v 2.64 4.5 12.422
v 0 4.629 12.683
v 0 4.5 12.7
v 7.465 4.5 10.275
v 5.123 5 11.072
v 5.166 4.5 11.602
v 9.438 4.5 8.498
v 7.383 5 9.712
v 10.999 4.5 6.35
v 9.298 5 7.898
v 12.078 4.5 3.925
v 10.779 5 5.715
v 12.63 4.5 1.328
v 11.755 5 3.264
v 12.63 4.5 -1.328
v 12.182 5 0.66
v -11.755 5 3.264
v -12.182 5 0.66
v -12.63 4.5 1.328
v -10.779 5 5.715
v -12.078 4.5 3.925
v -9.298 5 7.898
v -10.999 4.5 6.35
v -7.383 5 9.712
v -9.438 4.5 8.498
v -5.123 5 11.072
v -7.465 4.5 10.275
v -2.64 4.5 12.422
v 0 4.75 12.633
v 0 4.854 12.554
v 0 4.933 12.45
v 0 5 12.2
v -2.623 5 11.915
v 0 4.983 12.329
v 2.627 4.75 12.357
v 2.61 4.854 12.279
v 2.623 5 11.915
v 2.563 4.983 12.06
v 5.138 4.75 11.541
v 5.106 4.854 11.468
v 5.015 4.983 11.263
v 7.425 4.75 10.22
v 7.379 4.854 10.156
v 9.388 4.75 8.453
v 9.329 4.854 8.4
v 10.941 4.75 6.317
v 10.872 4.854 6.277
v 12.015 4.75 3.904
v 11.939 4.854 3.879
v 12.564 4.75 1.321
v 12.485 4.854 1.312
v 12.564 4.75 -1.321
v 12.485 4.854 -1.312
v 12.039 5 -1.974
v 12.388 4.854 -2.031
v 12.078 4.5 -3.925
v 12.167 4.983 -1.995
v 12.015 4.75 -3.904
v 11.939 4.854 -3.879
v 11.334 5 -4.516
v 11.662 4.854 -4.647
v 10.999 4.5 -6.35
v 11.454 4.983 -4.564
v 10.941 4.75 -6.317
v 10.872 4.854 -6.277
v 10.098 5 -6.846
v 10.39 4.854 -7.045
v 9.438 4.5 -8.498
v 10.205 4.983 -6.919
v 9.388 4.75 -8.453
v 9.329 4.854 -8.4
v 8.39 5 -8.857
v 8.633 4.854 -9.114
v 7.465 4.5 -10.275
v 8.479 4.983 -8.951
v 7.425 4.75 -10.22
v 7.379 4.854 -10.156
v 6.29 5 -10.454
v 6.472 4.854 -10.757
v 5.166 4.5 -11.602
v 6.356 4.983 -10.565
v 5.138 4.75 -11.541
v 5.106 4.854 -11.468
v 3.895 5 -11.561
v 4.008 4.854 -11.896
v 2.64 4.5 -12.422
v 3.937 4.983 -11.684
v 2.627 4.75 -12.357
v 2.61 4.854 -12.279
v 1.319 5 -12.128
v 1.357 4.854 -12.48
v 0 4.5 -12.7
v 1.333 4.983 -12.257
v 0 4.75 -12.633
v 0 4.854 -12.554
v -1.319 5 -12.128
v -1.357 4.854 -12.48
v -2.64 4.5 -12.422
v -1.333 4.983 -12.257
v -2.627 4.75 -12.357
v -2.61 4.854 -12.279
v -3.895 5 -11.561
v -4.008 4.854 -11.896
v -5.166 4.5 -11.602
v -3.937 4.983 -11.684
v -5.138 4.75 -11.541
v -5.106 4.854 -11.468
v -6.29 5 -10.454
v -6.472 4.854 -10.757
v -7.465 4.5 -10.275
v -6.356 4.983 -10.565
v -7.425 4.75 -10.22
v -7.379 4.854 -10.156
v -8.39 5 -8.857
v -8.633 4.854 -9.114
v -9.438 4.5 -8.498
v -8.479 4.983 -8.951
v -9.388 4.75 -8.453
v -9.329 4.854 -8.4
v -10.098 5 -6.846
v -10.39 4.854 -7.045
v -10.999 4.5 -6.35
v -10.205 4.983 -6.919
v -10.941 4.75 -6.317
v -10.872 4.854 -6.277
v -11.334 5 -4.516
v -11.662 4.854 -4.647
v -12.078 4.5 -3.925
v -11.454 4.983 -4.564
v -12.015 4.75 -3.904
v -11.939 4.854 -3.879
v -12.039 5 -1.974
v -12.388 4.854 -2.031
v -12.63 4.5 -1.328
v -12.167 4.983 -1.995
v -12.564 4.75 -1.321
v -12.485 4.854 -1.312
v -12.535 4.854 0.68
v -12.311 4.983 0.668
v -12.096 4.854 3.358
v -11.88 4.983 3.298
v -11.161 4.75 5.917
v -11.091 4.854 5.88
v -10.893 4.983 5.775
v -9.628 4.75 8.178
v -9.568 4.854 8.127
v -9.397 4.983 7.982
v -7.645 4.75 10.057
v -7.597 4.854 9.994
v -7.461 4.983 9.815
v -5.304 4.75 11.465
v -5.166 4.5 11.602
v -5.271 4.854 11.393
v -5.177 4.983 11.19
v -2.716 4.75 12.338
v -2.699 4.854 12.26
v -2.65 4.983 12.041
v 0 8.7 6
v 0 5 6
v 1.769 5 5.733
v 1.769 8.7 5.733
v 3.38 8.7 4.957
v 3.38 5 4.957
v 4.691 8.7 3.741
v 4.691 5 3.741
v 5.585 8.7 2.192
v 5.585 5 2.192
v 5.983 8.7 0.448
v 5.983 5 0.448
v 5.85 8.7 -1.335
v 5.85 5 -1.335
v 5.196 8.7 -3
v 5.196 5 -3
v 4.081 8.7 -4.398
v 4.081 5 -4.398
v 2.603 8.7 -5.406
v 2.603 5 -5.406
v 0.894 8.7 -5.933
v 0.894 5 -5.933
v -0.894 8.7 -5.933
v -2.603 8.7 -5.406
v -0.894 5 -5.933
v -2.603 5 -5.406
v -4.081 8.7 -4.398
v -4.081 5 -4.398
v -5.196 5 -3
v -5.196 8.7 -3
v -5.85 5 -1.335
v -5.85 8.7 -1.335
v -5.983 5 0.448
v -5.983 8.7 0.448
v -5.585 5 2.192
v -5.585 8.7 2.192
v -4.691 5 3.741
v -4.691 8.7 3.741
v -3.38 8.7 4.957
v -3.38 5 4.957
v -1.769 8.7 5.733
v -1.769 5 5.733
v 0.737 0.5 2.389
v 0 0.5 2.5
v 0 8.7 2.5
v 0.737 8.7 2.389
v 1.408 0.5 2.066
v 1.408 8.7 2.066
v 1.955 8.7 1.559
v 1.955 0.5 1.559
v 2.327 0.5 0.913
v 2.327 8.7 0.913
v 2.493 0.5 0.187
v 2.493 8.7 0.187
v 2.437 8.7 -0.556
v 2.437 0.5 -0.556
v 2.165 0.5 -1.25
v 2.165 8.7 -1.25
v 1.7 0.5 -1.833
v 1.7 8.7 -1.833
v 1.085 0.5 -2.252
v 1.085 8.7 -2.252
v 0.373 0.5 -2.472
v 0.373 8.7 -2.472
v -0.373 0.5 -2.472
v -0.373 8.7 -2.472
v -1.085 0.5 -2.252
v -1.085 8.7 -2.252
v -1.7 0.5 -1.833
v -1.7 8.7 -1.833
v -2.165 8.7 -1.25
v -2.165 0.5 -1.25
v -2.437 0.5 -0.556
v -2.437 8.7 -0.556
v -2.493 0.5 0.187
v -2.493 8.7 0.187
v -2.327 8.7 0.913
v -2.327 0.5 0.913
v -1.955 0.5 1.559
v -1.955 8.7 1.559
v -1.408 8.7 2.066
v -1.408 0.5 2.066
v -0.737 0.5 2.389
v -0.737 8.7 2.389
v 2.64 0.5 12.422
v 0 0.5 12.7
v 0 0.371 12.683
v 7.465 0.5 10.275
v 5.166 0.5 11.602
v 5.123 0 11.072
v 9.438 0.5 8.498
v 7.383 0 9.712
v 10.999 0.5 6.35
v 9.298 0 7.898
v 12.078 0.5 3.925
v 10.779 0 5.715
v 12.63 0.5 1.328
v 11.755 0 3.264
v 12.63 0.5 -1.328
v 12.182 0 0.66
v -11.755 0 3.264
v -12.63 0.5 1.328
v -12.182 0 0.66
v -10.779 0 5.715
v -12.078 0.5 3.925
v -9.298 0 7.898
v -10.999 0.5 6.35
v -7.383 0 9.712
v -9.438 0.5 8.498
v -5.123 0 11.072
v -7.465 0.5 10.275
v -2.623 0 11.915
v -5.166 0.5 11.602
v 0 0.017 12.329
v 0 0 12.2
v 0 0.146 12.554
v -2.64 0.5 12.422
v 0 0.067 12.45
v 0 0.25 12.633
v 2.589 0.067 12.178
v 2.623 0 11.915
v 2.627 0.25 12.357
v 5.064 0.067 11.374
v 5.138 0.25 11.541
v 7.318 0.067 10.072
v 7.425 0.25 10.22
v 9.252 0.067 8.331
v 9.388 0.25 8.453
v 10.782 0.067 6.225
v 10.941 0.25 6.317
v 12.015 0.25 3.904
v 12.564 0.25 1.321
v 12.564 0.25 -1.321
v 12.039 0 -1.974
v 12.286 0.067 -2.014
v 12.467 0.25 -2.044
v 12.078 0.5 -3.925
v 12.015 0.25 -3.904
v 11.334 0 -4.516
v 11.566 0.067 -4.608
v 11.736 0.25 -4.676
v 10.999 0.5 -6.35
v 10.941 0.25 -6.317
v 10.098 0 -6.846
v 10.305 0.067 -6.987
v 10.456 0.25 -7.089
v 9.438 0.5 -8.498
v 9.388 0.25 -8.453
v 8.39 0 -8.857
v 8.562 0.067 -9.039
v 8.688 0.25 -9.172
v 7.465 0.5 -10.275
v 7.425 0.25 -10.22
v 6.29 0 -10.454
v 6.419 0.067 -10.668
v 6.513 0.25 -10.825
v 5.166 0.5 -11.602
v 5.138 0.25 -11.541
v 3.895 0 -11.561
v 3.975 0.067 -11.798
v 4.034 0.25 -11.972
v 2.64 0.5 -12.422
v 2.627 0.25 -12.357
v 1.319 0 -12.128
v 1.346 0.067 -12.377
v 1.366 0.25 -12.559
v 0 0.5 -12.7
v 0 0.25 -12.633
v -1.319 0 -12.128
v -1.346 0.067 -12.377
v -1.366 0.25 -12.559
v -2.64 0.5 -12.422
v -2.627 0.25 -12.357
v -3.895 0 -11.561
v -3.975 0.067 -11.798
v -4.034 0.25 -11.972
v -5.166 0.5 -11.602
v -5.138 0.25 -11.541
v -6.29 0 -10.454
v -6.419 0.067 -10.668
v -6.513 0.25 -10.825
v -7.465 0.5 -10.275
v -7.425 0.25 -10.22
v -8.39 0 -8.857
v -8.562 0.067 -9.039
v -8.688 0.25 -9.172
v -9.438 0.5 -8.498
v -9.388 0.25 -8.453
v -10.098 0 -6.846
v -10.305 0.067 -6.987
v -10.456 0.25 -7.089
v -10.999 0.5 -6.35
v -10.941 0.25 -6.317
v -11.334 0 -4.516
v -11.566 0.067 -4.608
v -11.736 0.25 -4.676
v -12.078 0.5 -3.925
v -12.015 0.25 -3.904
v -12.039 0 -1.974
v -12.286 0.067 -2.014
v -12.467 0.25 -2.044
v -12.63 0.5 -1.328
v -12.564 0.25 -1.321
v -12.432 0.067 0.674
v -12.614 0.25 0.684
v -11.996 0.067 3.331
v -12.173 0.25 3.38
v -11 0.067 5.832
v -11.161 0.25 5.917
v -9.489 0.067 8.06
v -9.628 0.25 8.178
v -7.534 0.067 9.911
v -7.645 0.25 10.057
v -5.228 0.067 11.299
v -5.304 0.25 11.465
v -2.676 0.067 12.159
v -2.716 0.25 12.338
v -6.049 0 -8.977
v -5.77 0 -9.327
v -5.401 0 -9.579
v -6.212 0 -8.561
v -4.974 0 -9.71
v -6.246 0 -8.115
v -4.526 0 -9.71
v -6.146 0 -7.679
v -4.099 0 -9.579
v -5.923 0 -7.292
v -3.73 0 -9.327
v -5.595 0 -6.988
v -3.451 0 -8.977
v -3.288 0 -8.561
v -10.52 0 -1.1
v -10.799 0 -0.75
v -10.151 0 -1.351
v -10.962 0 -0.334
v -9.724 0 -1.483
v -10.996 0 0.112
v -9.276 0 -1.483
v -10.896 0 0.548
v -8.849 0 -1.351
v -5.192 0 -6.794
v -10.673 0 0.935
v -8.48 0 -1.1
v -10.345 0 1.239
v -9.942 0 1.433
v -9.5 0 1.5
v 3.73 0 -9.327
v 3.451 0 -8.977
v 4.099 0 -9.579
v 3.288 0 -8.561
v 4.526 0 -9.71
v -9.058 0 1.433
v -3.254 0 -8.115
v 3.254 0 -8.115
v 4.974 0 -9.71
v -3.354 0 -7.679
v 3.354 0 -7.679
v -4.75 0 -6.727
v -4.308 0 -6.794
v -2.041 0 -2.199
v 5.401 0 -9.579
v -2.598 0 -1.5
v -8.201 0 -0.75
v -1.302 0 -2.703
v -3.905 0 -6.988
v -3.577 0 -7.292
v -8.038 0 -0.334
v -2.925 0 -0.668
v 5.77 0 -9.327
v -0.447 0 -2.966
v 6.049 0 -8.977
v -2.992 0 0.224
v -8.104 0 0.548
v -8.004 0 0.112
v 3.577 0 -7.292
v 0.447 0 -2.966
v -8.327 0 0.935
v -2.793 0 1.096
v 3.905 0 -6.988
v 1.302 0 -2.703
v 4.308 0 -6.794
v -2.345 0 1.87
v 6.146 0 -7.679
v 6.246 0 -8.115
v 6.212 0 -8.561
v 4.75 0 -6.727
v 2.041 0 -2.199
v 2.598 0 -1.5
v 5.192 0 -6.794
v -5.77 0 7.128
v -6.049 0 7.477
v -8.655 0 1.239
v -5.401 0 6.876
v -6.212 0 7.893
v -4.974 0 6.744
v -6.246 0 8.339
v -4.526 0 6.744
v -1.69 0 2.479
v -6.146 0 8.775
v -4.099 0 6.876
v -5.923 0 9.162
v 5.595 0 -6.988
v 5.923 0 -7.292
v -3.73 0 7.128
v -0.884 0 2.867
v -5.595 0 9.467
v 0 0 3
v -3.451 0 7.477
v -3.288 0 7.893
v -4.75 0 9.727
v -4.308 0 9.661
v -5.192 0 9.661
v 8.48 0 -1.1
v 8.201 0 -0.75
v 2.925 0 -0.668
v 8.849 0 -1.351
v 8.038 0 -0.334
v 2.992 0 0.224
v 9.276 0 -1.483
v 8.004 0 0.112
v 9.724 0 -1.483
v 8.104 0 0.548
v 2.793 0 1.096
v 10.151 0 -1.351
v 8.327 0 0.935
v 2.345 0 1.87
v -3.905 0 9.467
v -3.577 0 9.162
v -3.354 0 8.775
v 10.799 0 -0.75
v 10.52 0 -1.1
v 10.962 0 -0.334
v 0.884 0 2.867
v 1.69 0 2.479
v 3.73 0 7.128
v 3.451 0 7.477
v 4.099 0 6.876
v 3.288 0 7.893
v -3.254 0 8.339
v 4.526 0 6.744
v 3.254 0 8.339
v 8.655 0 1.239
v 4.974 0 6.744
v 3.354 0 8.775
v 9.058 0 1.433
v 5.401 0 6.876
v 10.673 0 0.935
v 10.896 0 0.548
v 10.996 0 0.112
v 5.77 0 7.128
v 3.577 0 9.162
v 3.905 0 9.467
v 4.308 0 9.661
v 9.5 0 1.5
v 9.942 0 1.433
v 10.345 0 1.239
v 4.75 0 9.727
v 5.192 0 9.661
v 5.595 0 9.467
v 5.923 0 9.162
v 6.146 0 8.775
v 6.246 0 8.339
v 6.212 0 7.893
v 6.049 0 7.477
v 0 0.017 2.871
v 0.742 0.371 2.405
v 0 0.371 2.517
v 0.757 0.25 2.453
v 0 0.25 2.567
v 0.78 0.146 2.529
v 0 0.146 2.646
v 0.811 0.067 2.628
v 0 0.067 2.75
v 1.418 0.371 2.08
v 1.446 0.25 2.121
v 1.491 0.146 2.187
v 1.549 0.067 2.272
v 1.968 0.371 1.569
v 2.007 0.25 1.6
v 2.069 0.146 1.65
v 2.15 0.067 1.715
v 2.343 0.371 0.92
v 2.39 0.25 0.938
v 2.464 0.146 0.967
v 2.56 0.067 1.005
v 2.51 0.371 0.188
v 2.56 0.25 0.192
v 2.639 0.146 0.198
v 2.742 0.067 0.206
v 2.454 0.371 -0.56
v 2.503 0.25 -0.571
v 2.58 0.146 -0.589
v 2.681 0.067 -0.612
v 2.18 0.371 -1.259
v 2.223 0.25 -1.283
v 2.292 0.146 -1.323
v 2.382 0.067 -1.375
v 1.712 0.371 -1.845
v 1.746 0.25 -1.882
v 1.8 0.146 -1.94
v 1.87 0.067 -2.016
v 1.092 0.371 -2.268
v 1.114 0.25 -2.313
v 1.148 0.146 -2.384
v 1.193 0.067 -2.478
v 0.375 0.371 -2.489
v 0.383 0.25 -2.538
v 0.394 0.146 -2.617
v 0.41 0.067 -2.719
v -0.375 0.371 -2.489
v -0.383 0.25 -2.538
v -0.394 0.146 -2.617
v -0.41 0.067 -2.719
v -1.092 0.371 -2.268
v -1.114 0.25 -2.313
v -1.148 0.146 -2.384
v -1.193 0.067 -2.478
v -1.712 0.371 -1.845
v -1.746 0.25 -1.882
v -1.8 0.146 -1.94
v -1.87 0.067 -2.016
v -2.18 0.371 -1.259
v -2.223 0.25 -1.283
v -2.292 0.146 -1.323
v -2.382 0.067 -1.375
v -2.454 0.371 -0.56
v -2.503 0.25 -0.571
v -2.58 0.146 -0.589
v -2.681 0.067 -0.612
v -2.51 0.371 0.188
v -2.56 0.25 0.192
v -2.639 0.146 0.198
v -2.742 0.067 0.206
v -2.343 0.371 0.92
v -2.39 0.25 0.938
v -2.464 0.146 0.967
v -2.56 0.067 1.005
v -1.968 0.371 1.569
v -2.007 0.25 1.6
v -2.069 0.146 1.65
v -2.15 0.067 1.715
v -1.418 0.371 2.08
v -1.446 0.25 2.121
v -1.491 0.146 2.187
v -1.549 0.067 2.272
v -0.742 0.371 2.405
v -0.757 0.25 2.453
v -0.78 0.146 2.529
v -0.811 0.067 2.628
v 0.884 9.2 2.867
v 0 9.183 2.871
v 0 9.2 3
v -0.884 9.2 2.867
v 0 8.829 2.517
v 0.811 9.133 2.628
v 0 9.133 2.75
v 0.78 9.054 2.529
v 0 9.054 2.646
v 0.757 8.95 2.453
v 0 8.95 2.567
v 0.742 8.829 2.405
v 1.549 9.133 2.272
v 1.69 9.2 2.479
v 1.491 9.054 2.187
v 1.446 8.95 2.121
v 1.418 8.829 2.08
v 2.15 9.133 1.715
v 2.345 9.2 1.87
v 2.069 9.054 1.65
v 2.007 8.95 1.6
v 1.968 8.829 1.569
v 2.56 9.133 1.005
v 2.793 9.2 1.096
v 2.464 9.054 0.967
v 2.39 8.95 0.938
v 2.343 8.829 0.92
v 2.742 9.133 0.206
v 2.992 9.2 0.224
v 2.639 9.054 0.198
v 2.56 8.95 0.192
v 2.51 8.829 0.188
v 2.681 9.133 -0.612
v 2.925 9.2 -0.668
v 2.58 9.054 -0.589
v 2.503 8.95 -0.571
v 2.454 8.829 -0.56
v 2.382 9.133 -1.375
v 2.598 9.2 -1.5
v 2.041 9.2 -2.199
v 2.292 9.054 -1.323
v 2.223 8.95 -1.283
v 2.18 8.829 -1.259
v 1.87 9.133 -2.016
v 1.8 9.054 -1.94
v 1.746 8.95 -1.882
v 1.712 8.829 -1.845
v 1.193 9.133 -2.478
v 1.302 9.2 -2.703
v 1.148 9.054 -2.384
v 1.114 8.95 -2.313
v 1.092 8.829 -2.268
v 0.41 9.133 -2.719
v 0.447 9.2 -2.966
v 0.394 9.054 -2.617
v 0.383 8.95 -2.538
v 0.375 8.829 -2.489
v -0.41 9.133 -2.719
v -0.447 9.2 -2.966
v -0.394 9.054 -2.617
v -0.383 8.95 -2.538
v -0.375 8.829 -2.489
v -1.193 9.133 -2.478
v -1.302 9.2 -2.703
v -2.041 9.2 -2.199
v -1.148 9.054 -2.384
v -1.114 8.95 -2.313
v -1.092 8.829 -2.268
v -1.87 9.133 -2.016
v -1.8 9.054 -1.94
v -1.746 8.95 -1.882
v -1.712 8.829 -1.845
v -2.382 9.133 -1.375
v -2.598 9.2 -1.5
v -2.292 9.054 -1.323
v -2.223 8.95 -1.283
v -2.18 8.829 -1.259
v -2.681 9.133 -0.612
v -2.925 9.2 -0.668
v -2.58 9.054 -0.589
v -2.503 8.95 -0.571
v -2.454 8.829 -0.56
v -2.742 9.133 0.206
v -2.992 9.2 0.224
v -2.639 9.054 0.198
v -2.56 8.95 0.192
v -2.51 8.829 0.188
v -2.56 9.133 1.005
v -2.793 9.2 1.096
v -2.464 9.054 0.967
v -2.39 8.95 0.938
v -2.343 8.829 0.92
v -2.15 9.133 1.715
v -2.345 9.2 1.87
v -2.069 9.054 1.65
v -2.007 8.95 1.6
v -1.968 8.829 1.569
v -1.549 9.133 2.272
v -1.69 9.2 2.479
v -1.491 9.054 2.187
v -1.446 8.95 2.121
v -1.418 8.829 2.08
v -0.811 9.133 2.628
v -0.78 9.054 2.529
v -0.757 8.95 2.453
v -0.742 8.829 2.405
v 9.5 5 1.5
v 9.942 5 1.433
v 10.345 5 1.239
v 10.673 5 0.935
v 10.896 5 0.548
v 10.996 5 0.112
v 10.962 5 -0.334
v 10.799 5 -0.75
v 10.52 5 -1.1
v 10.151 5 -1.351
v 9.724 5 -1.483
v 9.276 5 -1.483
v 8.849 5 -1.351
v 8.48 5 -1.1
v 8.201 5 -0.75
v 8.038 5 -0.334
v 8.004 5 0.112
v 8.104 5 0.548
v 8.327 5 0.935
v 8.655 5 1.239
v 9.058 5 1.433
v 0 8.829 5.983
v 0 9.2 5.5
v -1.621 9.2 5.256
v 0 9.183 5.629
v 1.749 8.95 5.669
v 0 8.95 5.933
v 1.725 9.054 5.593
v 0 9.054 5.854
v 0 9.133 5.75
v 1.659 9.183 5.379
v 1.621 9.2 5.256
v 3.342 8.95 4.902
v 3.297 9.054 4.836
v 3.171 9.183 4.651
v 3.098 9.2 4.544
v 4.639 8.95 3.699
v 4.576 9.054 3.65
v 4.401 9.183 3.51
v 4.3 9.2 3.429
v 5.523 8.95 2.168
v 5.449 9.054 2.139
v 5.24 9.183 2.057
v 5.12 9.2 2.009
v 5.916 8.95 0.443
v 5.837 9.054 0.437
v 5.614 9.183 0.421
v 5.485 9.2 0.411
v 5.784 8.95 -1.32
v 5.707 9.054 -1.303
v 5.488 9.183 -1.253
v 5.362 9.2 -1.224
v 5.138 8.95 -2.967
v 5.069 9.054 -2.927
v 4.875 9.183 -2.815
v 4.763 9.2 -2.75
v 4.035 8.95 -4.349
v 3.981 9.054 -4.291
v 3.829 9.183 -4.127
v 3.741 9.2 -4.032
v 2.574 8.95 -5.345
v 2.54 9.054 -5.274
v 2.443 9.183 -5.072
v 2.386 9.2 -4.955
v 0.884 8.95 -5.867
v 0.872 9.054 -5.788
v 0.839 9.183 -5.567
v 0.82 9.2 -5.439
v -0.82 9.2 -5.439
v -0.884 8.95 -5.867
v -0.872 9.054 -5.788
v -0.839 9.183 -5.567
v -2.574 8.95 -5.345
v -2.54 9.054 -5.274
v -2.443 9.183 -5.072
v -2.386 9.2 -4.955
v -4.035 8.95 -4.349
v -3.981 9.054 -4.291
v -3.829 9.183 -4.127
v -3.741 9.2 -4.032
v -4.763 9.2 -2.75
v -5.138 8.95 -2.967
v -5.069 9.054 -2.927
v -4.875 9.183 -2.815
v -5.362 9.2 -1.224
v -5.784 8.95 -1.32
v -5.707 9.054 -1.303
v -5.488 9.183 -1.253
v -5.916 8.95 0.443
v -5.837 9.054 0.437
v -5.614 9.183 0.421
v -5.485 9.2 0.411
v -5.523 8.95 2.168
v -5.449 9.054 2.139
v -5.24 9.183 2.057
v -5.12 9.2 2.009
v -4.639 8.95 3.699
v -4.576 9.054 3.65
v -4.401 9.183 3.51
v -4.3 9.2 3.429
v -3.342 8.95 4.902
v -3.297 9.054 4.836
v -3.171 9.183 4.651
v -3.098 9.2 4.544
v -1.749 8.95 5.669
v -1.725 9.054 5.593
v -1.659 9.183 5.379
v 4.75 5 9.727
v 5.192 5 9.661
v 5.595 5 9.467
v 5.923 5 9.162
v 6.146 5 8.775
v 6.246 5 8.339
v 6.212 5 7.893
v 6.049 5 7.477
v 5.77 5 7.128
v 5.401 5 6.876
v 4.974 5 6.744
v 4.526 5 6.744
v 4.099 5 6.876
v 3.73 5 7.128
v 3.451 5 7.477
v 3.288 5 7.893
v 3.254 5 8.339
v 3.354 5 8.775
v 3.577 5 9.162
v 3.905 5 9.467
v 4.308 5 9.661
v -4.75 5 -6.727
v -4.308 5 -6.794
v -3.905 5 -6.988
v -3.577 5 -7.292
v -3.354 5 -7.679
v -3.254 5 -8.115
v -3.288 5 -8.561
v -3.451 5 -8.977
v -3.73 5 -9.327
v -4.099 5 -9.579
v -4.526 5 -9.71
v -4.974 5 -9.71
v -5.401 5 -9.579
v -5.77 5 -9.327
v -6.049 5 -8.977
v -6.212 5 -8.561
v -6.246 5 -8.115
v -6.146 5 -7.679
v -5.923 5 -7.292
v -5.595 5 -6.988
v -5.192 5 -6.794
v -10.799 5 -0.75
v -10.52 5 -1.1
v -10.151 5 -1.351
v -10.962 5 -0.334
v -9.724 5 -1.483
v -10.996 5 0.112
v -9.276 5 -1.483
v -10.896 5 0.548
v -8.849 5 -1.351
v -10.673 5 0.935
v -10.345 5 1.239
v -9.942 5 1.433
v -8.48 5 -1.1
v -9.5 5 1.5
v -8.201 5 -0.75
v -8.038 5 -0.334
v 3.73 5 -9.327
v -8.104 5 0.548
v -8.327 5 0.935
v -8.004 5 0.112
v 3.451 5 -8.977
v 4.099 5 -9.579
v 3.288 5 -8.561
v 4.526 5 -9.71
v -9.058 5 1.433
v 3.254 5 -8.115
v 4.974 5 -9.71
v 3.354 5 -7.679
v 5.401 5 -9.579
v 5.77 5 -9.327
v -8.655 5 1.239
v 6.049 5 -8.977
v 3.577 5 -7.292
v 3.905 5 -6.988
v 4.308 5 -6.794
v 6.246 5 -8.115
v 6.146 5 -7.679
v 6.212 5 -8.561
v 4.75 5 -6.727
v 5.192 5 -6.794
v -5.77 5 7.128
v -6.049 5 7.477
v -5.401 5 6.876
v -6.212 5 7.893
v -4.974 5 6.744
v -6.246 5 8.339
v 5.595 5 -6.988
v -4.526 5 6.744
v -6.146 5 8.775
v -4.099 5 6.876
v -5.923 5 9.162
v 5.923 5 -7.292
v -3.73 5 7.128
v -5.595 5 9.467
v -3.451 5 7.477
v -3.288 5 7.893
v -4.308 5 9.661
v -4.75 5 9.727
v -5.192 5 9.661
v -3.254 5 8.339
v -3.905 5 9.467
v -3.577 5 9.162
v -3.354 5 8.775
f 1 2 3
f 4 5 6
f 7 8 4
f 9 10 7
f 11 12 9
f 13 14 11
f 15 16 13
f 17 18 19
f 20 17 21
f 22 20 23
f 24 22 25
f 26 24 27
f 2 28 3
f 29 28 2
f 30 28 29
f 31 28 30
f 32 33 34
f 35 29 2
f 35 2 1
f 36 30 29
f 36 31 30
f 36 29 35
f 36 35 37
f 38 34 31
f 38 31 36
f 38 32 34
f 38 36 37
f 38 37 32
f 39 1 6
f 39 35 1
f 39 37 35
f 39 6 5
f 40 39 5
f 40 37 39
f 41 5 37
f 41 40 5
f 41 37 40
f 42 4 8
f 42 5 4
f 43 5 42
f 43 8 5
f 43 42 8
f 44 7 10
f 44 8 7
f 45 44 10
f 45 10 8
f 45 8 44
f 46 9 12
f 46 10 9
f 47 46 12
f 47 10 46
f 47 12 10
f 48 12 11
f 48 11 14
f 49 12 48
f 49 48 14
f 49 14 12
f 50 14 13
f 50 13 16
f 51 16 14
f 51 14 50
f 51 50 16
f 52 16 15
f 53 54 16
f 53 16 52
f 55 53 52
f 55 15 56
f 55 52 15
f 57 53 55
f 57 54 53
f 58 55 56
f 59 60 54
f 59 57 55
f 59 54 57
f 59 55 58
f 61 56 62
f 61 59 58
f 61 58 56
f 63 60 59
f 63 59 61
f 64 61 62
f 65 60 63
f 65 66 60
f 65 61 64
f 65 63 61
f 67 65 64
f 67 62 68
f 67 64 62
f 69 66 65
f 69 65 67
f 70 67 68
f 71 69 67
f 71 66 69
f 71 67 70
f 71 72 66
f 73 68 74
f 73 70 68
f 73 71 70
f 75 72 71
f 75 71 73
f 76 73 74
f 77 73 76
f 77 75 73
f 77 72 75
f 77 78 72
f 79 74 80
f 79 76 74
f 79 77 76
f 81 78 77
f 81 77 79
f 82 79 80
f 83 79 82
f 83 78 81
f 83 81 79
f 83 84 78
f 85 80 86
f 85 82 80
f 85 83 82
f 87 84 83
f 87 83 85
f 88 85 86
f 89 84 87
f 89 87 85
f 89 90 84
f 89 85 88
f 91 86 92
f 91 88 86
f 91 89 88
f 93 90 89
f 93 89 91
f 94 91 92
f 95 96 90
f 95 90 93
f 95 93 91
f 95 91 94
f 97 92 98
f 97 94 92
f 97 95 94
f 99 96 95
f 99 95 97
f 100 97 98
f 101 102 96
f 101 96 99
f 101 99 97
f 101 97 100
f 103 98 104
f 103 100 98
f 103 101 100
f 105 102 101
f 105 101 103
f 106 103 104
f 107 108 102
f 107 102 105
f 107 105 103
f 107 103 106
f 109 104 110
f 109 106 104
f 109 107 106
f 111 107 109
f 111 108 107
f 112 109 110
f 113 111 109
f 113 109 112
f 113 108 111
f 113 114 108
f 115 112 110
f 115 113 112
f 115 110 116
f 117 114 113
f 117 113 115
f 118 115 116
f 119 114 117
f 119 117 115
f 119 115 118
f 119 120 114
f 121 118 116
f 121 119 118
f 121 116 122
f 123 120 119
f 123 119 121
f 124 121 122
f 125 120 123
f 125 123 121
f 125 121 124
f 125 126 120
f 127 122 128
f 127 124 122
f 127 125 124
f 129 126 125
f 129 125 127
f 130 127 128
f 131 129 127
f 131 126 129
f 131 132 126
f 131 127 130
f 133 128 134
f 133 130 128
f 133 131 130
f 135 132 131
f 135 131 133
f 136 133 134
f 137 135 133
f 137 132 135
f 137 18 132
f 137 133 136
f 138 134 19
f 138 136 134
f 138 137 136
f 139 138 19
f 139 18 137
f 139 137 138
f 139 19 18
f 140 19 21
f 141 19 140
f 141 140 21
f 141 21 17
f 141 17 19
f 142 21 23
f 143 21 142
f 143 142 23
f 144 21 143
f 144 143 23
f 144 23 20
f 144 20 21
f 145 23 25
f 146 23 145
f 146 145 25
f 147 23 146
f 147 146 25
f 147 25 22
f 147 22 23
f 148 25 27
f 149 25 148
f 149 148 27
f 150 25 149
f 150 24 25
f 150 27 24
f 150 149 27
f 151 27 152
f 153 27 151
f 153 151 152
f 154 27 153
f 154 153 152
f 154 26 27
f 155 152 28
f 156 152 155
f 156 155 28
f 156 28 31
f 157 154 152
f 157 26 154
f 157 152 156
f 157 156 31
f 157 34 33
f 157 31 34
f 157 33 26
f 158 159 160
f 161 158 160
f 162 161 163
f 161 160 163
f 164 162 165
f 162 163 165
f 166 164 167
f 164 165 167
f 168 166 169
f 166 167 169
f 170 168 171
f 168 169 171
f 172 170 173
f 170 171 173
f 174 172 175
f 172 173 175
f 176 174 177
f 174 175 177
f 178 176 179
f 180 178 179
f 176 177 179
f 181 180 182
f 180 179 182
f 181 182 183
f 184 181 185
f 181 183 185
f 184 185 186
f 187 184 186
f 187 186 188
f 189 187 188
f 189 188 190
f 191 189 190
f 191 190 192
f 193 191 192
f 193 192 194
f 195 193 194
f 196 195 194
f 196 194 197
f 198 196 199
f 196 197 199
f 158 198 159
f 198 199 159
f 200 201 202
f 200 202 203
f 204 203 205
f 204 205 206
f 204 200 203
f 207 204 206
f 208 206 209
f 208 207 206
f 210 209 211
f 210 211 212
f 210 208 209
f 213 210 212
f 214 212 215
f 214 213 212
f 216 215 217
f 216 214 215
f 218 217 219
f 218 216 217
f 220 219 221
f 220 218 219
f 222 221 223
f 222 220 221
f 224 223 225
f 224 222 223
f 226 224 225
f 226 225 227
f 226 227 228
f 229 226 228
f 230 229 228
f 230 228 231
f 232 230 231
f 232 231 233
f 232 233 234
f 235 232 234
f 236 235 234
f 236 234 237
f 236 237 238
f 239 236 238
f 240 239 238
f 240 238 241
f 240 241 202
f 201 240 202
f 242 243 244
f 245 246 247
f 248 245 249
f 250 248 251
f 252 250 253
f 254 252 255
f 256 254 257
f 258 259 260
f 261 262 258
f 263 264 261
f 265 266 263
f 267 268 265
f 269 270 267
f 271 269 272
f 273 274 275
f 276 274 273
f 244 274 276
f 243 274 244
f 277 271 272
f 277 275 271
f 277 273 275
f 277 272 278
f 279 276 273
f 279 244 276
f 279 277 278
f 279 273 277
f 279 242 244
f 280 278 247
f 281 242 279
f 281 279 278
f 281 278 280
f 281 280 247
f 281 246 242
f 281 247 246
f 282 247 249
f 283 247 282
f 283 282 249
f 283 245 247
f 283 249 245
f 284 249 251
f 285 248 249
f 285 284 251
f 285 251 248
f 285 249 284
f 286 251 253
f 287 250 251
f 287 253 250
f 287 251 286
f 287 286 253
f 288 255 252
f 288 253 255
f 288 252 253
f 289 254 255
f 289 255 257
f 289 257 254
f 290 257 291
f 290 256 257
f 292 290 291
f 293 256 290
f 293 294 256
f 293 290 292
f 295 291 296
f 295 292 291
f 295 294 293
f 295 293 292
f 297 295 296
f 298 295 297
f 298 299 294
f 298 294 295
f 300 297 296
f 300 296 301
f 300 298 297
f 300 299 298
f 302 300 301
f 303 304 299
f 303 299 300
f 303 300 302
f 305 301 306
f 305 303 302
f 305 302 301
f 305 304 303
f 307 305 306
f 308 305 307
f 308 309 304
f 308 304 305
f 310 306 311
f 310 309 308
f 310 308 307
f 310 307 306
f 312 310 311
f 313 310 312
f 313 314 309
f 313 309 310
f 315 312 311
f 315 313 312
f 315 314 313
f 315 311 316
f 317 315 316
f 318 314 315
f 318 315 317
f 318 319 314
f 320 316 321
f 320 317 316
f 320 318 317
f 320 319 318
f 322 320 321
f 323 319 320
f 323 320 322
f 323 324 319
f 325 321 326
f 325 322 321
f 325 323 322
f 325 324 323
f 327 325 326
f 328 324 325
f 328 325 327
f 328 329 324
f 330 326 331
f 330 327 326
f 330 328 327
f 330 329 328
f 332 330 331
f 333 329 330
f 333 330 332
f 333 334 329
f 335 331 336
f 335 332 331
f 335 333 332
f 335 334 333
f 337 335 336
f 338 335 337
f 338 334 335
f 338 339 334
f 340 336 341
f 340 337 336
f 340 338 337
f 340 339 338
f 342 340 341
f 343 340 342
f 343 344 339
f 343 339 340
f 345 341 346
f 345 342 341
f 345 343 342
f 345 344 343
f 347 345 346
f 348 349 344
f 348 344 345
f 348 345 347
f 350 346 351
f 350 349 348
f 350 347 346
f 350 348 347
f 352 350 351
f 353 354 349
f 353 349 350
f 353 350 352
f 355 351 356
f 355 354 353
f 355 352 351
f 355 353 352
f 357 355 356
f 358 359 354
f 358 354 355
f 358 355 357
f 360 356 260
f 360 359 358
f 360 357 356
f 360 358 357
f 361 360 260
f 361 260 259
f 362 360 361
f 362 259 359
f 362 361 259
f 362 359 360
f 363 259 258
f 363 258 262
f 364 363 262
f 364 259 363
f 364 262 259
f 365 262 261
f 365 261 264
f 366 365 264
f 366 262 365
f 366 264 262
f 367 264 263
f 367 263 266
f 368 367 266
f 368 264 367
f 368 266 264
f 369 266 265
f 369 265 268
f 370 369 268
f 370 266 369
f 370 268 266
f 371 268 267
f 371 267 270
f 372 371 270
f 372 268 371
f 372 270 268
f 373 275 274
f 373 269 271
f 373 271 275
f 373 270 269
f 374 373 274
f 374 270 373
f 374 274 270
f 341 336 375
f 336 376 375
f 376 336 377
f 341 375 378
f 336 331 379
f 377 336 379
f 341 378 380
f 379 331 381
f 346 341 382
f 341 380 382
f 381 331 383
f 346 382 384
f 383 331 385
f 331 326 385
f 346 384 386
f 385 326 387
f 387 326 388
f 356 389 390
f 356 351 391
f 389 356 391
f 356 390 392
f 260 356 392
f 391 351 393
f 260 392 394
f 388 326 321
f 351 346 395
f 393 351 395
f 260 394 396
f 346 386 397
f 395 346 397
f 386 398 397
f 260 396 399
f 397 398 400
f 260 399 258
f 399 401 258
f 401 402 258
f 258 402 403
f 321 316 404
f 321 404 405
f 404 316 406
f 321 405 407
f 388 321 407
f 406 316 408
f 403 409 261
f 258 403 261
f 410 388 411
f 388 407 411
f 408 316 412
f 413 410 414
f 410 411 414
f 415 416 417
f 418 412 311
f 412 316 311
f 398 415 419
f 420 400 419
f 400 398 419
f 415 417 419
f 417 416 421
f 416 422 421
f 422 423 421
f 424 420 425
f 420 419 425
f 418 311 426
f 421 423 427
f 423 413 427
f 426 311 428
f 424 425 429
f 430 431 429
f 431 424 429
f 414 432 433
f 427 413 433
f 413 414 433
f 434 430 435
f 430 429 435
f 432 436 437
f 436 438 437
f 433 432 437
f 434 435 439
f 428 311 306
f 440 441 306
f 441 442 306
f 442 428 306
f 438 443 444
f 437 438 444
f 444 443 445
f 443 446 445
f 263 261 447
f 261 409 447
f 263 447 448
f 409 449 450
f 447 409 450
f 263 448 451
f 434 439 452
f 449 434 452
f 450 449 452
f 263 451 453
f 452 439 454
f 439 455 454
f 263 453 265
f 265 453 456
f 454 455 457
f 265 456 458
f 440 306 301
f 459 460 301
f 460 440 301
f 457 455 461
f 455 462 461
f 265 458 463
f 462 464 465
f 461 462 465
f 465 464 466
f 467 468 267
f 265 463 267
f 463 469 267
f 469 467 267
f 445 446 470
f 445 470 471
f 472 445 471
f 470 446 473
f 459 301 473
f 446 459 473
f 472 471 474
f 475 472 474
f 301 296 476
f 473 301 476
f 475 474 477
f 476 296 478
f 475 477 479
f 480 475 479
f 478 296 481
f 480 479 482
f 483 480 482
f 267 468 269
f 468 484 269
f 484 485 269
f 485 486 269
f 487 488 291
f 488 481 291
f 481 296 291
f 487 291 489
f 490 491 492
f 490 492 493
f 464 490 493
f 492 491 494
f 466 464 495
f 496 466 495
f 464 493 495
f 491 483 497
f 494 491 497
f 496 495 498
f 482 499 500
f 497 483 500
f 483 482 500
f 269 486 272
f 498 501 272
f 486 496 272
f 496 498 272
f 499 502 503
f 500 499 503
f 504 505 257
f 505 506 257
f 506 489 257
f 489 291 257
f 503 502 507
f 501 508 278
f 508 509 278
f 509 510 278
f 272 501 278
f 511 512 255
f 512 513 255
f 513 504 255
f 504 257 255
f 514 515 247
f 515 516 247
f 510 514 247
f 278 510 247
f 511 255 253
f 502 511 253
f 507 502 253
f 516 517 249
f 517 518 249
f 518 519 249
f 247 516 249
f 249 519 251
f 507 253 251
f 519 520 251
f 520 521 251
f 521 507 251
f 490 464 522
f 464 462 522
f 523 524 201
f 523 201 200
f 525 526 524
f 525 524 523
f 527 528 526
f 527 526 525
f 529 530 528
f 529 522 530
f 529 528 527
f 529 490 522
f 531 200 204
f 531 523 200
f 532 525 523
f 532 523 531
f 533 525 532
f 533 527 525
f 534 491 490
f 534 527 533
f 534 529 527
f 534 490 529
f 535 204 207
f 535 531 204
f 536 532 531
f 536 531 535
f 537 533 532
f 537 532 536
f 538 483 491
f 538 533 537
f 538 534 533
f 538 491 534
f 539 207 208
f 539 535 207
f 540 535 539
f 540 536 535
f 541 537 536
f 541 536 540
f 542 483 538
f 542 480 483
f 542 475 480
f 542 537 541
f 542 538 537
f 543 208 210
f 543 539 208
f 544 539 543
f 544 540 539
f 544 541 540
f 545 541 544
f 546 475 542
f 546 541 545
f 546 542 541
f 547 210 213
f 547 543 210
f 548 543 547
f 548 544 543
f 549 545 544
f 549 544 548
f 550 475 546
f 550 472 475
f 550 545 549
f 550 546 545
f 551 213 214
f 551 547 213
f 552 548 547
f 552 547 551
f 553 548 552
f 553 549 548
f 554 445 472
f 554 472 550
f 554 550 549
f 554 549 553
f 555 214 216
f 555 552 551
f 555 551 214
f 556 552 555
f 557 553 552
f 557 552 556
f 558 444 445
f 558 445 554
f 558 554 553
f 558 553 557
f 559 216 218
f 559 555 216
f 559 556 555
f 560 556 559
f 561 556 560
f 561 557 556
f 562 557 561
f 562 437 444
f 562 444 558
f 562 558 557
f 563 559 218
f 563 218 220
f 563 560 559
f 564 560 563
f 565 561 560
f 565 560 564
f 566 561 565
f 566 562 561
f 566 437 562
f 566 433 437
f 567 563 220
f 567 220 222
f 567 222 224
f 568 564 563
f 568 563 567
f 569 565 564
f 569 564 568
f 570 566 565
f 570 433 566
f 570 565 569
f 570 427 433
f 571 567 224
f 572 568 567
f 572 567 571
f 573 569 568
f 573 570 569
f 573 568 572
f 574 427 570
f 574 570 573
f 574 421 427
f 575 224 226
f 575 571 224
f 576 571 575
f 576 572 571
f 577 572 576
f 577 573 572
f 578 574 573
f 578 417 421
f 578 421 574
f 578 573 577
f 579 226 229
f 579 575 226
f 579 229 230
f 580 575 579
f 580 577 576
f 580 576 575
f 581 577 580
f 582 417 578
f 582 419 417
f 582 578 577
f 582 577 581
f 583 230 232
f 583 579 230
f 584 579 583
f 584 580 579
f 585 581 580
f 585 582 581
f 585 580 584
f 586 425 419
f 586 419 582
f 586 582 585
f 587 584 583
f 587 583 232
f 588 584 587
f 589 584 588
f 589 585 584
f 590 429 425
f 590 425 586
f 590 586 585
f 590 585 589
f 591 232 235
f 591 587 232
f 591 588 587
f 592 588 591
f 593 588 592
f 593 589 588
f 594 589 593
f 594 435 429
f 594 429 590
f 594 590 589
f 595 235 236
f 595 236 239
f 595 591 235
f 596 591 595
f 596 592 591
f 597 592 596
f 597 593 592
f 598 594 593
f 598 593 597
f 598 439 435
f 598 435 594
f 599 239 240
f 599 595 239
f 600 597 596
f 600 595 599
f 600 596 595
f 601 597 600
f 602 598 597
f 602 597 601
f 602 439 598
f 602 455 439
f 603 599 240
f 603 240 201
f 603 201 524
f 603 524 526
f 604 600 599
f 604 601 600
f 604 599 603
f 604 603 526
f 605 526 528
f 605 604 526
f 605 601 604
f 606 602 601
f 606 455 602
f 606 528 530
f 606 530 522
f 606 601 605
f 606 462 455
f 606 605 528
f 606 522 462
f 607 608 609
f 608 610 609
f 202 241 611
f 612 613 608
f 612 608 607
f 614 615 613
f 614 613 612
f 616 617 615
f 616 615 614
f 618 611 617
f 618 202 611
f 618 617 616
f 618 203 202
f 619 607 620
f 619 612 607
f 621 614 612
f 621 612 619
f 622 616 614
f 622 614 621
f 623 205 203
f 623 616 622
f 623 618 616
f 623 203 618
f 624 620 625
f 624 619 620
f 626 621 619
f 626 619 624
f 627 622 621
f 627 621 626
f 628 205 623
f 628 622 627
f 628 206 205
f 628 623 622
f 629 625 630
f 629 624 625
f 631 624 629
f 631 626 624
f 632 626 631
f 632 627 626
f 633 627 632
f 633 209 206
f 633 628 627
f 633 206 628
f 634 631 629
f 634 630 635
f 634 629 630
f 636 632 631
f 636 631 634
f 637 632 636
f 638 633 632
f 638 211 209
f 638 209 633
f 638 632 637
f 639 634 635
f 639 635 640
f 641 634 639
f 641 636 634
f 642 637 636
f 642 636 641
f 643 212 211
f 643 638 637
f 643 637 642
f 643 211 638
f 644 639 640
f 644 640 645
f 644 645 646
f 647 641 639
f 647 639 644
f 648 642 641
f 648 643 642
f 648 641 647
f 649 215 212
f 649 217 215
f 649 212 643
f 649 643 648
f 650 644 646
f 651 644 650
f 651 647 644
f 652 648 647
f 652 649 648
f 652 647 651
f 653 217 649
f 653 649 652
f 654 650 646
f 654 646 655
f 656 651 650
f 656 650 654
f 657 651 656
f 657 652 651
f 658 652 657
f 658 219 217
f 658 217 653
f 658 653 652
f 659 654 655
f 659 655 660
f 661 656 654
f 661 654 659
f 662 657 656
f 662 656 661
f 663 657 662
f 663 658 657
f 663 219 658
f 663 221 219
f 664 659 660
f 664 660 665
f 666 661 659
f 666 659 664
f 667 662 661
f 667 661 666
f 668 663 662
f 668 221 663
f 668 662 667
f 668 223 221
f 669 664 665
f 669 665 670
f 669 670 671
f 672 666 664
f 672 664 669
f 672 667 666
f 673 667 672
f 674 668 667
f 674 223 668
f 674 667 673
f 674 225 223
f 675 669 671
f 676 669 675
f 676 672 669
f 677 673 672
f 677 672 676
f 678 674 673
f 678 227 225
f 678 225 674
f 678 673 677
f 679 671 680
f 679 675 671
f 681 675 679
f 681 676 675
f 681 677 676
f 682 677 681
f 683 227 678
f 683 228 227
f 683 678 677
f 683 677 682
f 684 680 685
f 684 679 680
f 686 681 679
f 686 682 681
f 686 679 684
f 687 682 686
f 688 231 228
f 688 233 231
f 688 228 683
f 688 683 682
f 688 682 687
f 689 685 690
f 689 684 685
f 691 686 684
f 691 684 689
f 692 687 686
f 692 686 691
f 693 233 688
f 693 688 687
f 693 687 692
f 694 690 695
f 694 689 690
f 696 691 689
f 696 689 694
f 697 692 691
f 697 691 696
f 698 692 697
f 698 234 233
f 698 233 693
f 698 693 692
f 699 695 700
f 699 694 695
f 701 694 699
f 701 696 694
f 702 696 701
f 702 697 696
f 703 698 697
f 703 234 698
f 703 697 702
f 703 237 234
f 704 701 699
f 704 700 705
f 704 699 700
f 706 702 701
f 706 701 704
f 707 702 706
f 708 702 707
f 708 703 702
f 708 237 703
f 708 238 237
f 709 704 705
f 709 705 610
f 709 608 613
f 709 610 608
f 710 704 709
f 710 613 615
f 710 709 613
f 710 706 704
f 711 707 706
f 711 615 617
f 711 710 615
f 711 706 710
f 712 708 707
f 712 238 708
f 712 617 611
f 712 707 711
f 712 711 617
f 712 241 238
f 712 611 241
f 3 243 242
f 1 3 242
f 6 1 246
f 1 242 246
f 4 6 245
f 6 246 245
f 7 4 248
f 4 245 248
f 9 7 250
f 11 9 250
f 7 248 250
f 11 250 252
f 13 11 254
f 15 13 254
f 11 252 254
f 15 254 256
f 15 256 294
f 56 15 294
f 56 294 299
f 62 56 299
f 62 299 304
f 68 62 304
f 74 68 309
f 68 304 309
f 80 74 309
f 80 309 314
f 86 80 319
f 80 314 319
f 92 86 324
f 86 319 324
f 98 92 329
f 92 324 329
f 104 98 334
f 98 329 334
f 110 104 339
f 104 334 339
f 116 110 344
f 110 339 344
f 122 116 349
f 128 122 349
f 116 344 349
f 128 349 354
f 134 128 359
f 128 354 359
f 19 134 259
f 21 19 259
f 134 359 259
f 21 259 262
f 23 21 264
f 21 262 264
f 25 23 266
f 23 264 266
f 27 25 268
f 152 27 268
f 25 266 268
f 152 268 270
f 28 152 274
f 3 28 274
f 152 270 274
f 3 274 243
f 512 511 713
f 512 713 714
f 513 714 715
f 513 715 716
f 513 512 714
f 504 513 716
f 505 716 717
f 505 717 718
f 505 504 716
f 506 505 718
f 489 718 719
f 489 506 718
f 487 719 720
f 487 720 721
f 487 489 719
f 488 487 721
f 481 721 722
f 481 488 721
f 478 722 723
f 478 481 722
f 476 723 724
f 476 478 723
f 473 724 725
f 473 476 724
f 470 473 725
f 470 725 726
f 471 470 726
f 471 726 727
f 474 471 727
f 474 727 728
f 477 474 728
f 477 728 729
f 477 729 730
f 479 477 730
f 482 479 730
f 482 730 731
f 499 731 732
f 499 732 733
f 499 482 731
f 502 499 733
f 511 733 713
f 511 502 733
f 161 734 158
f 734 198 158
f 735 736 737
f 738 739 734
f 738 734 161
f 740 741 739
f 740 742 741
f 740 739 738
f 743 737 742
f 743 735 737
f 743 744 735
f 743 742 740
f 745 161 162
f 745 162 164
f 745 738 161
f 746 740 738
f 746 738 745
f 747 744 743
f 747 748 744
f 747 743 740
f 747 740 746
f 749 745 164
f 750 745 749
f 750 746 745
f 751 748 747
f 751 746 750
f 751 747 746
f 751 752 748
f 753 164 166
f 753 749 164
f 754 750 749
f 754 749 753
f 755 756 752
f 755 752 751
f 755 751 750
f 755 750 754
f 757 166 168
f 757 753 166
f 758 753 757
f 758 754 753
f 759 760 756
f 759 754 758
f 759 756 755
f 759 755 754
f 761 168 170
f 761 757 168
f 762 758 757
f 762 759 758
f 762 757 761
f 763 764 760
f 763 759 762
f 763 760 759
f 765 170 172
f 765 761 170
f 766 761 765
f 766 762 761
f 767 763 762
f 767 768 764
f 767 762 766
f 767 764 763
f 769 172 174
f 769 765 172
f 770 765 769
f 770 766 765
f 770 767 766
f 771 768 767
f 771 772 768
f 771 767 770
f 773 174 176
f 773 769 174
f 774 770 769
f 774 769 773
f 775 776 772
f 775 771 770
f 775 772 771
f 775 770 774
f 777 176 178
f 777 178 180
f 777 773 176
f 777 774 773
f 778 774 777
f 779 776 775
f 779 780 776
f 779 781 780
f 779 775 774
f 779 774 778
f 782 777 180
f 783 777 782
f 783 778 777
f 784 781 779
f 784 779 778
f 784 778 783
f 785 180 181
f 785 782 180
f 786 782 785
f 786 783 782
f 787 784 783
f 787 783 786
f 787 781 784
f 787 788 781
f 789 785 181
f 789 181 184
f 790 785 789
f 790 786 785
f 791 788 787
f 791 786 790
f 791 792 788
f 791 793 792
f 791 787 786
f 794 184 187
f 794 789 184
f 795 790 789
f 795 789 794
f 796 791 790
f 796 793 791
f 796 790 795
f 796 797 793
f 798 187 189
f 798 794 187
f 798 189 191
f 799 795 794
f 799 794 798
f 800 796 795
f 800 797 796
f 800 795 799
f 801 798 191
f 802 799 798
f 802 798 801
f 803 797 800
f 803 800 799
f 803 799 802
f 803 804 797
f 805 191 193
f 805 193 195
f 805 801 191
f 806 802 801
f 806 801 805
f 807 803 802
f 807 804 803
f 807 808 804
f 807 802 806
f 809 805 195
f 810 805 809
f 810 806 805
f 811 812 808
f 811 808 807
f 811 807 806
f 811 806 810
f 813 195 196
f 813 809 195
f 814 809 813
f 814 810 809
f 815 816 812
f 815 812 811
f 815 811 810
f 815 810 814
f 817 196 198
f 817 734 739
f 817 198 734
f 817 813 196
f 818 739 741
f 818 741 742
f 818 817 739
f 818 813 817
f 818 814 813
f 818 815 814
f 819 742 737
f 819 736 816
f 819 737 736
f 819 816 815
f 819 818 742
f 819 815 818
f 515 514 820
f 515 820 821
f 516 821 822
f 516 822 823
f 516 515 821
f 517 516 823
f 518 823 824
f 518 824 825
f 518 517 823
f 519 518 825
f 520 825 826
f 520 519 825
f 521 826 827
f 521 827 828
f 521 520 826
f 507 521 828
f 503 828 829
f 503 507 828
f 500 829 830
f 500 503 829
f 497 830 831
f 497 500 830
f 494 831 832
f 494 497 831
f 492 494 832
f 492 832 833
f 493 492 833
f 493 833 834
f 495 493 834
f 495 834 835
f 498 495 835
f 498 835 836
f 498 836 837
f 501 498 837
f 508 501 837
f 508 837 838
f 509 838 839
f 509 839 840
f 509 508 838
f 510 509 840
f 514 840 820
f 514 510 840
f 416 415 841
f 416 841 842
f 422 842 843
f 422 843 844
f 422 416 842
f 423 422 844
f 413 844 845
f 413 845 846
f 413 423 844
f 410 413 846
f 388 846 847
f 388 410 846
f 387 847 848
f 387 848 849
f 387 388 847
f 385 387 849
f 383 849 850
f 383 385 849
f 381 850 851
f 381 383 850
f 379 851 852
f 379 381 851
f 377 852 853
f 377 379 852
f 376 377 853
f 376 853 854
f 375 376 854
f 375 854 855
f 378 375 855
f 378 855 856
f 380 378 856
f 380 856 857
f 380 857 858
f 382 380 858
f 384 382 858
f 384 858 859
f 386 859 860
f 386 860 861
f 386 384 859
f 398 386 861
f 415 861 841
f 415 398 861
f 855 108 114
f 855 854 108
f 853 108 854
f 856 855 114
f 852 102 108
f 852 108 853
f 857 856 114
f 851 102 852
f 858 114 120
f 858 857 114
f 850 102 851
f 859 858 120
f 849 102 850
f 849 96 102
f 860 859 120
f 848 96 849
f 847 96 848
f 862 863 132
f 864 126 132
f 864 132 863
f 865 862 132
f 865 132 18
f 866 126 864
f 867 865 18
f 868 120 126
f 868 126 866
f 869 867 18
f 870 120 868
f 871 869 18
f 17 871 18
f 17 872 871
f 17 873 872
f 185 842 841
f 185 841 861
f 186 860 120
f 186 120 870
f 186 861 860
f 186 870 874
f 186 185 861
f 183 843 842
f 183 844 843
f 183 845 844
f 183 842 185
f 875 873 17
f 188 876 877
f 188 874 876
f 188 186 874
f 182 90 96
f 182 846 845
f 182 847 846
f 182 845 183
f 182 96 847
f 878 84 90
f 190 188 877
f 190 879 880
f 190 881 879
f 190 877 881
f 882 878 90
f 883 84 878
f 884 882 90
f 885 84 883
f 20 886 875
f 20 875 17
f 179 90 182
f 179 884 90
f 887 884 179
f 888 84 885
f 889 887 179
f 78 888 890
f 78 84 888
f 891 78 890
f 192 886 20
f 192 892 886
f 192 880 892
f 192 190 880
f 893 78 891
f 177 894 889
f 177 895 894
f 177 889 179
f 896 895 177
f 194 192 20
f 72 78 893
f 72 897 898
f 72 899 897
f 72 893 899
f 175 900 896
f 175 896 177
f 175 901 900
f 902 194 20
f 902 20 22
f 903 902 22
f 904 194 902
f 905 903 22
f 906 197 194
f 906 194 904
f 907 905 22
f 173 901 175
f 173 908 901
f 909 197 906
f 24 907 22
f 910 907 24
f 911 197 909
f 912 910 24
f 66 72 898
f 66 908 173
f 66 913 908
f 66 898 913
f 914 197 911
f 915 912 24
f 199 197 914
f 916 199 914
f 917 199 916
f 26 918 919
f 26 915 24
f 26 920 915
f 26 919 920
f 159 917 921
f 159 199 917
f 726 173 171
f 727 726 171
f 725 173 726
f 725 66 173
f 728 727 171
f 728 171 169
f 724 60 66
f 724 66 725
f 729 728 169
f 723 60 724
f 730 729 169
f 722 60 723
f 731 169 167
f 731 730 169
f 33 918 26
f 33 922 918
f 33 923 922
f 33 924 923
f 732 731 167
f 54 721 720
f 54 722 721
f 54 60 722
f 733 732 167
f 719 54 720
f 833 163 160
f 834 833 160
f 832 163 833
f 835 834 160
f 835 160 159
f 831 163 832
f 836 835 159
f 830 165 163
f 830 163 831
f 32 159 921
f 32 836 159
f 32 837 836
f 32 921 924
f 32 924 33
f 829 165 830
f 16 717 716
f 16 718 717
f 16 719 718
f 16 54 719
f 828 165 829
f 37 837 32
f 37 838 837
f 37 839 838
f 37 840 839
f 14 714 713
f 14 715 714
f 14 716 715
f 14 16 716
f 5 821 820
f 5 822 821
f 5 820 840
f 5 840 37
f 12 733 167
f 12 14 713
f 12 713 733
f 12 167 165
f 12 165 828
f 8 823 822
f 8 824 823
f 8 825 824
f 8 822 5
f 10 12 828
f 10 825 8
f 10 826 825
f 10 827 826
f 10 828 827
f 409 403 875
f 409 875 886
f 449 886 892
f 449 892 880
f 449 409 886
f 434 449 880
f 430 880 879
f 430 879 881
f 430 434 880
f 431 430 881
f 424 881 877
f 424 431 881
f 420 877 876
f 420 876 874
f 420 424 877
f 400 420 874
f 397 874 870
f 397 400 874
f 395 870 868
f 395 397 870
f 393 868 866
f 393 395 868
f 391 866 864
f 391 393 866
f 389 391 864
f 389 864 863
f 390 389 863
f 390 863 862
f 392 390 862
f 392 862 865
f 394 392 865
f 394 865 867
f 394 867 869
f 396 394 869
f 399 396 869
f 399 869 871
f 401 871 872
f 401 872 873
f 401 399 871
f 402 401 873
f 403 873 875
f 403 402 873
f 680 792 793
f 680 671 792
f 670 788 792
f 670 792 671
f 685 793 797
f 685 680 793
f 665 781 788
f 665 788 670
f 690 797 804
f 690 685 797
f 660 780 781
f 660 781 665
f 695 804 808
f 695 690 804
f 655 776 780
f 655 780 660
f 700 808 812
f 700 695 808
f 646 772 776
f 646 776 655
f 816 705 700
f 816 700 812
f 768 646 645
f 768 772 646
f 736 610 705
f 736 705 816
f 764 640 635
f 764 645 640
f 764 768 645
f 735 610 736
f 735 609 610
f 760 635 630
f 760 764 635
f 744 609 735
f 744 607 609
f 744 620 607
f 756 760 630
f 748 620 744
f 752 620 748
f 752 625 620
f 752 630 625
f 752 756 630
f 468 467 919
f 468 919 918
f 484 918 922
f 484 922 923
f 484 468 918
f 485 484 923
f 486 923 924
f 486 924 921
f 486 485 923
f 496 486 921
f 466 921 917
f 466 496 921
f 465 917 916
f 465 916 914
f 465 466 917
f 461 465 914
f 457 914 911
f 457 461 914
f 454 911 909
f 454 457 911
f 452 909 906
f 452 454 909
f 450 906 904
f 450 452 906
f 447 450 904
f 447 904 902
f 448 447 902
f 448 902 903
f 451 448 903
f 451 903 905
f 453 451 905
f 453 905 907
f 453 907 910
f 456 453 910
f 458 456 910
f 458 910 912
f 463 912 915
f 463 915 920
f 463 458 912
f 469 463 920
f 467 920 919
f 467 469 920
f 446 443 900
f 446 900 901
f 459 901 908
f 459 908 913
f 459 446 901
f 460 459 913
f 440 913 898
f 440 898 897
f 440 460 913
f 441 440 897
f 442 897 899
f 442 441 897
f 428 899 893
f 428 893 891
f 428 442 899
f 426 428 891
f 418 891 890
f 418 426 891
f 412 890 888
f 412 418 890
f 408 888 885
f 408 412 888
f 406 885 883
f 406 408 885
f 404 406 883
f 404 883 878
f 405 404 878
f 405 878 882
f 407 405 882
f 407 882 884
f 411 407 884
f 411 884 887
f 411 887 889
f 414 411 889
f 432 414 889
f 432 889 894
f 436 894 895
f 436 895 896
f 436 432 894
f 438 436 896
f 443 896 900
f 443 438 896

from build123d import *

# Parameters (mm, degrees)
SKETCH1_R        = 12.7
SKETCH1_R_2      = 1.5
SKETCH1_R_3      = 2.5
EXTRUSION1_DEPTH = 5
SKETCH2_R        = 6
SKETCH2_R_2      = 2.5
EXTRUSION2_DEPTH = 4.2
FILLET1_R        = 0.5


with BuildPart() as part:
    # Sketch1 → Extrusion1 (new body)
    with BuildSketch(Plane(origin=(0, 0, 0), x_dir=(-1, 0, 0), z_dir=(0, 1, 0))):
        with Locations(Location((0, 0, 0), (0, 0, 90))):
            Circle(SKETCH1_R)
        with Locations(Location((-4.75, -8.227241336, 0), (0, 0, 90))):
            Circle(SKETCH1_R_2, mode=Mode.SUBTRACT)
        with Locations(Location((0, 0, 0), (0, 0, 90))):
            Circle(SKETCH1_R_3, mode=Mode.SUBTRACT)
        with Locations(Location((-9.5, 0, 0), (0, 0, 90))):
            Circle(SKETCH1_R_2, mode=Mode.SUBTRACT)
        with Locations(Location((-4.75, 8.227241336, 0), (0, 0, 90))):
            Circle(SKETCH1_R_2, mode=Mode.SUBTRACT)
        with Locations(Location((4.75, 8.227241336, 0), (0, 0, 90))):
            Circle(SKETCH1_R_2, mode=Mode.SUBTRACT)
        with Locations(Location((9.5, 0, 0), (0, 0, 90))):
            Circle(SKETCH1_R_2, mode=Mode.SUBTRACT)
        with Locations(Location((4.75, -8.227241336, 0), (0, 0, 90))):
            Circle(SKETCH1_R_2, mode=Mode.SUBTRACT)
    extrude(amount=EXTRUSION1_DEPTH)

    # Sketch2 → Extrusion2 (add)
    with BuildSketch(Plane(origin=(0, 5, 0), x_dir=(1, 0, 0), z_dir=(0, 1, 0))):
        with Locations(Location((0, 0, 0), (0, 0, 270))):
            Circle(SKETCH2_R)
        with Locations(Location((0, 0, 0), (0, 0, 270))):
            Circle(SKETCH2_R_2, mode=Mode.SUBTRACT)
    extrude(amount=EXTRUSION2_DEPTH)

    # Fillet1
    fillet1_edges = [part.edges().sort_by_distance(p)[0] for p in [
        (0, 0, -12.7),
        (0, 0, -2.5),
        (0, 9.2, -2.5),
        (0, 9.2, -6),
        (0, 5, -12.7),
    ]]
    fillet(fillet1_edges, radius=FILLET1_R)


solid = part.part
